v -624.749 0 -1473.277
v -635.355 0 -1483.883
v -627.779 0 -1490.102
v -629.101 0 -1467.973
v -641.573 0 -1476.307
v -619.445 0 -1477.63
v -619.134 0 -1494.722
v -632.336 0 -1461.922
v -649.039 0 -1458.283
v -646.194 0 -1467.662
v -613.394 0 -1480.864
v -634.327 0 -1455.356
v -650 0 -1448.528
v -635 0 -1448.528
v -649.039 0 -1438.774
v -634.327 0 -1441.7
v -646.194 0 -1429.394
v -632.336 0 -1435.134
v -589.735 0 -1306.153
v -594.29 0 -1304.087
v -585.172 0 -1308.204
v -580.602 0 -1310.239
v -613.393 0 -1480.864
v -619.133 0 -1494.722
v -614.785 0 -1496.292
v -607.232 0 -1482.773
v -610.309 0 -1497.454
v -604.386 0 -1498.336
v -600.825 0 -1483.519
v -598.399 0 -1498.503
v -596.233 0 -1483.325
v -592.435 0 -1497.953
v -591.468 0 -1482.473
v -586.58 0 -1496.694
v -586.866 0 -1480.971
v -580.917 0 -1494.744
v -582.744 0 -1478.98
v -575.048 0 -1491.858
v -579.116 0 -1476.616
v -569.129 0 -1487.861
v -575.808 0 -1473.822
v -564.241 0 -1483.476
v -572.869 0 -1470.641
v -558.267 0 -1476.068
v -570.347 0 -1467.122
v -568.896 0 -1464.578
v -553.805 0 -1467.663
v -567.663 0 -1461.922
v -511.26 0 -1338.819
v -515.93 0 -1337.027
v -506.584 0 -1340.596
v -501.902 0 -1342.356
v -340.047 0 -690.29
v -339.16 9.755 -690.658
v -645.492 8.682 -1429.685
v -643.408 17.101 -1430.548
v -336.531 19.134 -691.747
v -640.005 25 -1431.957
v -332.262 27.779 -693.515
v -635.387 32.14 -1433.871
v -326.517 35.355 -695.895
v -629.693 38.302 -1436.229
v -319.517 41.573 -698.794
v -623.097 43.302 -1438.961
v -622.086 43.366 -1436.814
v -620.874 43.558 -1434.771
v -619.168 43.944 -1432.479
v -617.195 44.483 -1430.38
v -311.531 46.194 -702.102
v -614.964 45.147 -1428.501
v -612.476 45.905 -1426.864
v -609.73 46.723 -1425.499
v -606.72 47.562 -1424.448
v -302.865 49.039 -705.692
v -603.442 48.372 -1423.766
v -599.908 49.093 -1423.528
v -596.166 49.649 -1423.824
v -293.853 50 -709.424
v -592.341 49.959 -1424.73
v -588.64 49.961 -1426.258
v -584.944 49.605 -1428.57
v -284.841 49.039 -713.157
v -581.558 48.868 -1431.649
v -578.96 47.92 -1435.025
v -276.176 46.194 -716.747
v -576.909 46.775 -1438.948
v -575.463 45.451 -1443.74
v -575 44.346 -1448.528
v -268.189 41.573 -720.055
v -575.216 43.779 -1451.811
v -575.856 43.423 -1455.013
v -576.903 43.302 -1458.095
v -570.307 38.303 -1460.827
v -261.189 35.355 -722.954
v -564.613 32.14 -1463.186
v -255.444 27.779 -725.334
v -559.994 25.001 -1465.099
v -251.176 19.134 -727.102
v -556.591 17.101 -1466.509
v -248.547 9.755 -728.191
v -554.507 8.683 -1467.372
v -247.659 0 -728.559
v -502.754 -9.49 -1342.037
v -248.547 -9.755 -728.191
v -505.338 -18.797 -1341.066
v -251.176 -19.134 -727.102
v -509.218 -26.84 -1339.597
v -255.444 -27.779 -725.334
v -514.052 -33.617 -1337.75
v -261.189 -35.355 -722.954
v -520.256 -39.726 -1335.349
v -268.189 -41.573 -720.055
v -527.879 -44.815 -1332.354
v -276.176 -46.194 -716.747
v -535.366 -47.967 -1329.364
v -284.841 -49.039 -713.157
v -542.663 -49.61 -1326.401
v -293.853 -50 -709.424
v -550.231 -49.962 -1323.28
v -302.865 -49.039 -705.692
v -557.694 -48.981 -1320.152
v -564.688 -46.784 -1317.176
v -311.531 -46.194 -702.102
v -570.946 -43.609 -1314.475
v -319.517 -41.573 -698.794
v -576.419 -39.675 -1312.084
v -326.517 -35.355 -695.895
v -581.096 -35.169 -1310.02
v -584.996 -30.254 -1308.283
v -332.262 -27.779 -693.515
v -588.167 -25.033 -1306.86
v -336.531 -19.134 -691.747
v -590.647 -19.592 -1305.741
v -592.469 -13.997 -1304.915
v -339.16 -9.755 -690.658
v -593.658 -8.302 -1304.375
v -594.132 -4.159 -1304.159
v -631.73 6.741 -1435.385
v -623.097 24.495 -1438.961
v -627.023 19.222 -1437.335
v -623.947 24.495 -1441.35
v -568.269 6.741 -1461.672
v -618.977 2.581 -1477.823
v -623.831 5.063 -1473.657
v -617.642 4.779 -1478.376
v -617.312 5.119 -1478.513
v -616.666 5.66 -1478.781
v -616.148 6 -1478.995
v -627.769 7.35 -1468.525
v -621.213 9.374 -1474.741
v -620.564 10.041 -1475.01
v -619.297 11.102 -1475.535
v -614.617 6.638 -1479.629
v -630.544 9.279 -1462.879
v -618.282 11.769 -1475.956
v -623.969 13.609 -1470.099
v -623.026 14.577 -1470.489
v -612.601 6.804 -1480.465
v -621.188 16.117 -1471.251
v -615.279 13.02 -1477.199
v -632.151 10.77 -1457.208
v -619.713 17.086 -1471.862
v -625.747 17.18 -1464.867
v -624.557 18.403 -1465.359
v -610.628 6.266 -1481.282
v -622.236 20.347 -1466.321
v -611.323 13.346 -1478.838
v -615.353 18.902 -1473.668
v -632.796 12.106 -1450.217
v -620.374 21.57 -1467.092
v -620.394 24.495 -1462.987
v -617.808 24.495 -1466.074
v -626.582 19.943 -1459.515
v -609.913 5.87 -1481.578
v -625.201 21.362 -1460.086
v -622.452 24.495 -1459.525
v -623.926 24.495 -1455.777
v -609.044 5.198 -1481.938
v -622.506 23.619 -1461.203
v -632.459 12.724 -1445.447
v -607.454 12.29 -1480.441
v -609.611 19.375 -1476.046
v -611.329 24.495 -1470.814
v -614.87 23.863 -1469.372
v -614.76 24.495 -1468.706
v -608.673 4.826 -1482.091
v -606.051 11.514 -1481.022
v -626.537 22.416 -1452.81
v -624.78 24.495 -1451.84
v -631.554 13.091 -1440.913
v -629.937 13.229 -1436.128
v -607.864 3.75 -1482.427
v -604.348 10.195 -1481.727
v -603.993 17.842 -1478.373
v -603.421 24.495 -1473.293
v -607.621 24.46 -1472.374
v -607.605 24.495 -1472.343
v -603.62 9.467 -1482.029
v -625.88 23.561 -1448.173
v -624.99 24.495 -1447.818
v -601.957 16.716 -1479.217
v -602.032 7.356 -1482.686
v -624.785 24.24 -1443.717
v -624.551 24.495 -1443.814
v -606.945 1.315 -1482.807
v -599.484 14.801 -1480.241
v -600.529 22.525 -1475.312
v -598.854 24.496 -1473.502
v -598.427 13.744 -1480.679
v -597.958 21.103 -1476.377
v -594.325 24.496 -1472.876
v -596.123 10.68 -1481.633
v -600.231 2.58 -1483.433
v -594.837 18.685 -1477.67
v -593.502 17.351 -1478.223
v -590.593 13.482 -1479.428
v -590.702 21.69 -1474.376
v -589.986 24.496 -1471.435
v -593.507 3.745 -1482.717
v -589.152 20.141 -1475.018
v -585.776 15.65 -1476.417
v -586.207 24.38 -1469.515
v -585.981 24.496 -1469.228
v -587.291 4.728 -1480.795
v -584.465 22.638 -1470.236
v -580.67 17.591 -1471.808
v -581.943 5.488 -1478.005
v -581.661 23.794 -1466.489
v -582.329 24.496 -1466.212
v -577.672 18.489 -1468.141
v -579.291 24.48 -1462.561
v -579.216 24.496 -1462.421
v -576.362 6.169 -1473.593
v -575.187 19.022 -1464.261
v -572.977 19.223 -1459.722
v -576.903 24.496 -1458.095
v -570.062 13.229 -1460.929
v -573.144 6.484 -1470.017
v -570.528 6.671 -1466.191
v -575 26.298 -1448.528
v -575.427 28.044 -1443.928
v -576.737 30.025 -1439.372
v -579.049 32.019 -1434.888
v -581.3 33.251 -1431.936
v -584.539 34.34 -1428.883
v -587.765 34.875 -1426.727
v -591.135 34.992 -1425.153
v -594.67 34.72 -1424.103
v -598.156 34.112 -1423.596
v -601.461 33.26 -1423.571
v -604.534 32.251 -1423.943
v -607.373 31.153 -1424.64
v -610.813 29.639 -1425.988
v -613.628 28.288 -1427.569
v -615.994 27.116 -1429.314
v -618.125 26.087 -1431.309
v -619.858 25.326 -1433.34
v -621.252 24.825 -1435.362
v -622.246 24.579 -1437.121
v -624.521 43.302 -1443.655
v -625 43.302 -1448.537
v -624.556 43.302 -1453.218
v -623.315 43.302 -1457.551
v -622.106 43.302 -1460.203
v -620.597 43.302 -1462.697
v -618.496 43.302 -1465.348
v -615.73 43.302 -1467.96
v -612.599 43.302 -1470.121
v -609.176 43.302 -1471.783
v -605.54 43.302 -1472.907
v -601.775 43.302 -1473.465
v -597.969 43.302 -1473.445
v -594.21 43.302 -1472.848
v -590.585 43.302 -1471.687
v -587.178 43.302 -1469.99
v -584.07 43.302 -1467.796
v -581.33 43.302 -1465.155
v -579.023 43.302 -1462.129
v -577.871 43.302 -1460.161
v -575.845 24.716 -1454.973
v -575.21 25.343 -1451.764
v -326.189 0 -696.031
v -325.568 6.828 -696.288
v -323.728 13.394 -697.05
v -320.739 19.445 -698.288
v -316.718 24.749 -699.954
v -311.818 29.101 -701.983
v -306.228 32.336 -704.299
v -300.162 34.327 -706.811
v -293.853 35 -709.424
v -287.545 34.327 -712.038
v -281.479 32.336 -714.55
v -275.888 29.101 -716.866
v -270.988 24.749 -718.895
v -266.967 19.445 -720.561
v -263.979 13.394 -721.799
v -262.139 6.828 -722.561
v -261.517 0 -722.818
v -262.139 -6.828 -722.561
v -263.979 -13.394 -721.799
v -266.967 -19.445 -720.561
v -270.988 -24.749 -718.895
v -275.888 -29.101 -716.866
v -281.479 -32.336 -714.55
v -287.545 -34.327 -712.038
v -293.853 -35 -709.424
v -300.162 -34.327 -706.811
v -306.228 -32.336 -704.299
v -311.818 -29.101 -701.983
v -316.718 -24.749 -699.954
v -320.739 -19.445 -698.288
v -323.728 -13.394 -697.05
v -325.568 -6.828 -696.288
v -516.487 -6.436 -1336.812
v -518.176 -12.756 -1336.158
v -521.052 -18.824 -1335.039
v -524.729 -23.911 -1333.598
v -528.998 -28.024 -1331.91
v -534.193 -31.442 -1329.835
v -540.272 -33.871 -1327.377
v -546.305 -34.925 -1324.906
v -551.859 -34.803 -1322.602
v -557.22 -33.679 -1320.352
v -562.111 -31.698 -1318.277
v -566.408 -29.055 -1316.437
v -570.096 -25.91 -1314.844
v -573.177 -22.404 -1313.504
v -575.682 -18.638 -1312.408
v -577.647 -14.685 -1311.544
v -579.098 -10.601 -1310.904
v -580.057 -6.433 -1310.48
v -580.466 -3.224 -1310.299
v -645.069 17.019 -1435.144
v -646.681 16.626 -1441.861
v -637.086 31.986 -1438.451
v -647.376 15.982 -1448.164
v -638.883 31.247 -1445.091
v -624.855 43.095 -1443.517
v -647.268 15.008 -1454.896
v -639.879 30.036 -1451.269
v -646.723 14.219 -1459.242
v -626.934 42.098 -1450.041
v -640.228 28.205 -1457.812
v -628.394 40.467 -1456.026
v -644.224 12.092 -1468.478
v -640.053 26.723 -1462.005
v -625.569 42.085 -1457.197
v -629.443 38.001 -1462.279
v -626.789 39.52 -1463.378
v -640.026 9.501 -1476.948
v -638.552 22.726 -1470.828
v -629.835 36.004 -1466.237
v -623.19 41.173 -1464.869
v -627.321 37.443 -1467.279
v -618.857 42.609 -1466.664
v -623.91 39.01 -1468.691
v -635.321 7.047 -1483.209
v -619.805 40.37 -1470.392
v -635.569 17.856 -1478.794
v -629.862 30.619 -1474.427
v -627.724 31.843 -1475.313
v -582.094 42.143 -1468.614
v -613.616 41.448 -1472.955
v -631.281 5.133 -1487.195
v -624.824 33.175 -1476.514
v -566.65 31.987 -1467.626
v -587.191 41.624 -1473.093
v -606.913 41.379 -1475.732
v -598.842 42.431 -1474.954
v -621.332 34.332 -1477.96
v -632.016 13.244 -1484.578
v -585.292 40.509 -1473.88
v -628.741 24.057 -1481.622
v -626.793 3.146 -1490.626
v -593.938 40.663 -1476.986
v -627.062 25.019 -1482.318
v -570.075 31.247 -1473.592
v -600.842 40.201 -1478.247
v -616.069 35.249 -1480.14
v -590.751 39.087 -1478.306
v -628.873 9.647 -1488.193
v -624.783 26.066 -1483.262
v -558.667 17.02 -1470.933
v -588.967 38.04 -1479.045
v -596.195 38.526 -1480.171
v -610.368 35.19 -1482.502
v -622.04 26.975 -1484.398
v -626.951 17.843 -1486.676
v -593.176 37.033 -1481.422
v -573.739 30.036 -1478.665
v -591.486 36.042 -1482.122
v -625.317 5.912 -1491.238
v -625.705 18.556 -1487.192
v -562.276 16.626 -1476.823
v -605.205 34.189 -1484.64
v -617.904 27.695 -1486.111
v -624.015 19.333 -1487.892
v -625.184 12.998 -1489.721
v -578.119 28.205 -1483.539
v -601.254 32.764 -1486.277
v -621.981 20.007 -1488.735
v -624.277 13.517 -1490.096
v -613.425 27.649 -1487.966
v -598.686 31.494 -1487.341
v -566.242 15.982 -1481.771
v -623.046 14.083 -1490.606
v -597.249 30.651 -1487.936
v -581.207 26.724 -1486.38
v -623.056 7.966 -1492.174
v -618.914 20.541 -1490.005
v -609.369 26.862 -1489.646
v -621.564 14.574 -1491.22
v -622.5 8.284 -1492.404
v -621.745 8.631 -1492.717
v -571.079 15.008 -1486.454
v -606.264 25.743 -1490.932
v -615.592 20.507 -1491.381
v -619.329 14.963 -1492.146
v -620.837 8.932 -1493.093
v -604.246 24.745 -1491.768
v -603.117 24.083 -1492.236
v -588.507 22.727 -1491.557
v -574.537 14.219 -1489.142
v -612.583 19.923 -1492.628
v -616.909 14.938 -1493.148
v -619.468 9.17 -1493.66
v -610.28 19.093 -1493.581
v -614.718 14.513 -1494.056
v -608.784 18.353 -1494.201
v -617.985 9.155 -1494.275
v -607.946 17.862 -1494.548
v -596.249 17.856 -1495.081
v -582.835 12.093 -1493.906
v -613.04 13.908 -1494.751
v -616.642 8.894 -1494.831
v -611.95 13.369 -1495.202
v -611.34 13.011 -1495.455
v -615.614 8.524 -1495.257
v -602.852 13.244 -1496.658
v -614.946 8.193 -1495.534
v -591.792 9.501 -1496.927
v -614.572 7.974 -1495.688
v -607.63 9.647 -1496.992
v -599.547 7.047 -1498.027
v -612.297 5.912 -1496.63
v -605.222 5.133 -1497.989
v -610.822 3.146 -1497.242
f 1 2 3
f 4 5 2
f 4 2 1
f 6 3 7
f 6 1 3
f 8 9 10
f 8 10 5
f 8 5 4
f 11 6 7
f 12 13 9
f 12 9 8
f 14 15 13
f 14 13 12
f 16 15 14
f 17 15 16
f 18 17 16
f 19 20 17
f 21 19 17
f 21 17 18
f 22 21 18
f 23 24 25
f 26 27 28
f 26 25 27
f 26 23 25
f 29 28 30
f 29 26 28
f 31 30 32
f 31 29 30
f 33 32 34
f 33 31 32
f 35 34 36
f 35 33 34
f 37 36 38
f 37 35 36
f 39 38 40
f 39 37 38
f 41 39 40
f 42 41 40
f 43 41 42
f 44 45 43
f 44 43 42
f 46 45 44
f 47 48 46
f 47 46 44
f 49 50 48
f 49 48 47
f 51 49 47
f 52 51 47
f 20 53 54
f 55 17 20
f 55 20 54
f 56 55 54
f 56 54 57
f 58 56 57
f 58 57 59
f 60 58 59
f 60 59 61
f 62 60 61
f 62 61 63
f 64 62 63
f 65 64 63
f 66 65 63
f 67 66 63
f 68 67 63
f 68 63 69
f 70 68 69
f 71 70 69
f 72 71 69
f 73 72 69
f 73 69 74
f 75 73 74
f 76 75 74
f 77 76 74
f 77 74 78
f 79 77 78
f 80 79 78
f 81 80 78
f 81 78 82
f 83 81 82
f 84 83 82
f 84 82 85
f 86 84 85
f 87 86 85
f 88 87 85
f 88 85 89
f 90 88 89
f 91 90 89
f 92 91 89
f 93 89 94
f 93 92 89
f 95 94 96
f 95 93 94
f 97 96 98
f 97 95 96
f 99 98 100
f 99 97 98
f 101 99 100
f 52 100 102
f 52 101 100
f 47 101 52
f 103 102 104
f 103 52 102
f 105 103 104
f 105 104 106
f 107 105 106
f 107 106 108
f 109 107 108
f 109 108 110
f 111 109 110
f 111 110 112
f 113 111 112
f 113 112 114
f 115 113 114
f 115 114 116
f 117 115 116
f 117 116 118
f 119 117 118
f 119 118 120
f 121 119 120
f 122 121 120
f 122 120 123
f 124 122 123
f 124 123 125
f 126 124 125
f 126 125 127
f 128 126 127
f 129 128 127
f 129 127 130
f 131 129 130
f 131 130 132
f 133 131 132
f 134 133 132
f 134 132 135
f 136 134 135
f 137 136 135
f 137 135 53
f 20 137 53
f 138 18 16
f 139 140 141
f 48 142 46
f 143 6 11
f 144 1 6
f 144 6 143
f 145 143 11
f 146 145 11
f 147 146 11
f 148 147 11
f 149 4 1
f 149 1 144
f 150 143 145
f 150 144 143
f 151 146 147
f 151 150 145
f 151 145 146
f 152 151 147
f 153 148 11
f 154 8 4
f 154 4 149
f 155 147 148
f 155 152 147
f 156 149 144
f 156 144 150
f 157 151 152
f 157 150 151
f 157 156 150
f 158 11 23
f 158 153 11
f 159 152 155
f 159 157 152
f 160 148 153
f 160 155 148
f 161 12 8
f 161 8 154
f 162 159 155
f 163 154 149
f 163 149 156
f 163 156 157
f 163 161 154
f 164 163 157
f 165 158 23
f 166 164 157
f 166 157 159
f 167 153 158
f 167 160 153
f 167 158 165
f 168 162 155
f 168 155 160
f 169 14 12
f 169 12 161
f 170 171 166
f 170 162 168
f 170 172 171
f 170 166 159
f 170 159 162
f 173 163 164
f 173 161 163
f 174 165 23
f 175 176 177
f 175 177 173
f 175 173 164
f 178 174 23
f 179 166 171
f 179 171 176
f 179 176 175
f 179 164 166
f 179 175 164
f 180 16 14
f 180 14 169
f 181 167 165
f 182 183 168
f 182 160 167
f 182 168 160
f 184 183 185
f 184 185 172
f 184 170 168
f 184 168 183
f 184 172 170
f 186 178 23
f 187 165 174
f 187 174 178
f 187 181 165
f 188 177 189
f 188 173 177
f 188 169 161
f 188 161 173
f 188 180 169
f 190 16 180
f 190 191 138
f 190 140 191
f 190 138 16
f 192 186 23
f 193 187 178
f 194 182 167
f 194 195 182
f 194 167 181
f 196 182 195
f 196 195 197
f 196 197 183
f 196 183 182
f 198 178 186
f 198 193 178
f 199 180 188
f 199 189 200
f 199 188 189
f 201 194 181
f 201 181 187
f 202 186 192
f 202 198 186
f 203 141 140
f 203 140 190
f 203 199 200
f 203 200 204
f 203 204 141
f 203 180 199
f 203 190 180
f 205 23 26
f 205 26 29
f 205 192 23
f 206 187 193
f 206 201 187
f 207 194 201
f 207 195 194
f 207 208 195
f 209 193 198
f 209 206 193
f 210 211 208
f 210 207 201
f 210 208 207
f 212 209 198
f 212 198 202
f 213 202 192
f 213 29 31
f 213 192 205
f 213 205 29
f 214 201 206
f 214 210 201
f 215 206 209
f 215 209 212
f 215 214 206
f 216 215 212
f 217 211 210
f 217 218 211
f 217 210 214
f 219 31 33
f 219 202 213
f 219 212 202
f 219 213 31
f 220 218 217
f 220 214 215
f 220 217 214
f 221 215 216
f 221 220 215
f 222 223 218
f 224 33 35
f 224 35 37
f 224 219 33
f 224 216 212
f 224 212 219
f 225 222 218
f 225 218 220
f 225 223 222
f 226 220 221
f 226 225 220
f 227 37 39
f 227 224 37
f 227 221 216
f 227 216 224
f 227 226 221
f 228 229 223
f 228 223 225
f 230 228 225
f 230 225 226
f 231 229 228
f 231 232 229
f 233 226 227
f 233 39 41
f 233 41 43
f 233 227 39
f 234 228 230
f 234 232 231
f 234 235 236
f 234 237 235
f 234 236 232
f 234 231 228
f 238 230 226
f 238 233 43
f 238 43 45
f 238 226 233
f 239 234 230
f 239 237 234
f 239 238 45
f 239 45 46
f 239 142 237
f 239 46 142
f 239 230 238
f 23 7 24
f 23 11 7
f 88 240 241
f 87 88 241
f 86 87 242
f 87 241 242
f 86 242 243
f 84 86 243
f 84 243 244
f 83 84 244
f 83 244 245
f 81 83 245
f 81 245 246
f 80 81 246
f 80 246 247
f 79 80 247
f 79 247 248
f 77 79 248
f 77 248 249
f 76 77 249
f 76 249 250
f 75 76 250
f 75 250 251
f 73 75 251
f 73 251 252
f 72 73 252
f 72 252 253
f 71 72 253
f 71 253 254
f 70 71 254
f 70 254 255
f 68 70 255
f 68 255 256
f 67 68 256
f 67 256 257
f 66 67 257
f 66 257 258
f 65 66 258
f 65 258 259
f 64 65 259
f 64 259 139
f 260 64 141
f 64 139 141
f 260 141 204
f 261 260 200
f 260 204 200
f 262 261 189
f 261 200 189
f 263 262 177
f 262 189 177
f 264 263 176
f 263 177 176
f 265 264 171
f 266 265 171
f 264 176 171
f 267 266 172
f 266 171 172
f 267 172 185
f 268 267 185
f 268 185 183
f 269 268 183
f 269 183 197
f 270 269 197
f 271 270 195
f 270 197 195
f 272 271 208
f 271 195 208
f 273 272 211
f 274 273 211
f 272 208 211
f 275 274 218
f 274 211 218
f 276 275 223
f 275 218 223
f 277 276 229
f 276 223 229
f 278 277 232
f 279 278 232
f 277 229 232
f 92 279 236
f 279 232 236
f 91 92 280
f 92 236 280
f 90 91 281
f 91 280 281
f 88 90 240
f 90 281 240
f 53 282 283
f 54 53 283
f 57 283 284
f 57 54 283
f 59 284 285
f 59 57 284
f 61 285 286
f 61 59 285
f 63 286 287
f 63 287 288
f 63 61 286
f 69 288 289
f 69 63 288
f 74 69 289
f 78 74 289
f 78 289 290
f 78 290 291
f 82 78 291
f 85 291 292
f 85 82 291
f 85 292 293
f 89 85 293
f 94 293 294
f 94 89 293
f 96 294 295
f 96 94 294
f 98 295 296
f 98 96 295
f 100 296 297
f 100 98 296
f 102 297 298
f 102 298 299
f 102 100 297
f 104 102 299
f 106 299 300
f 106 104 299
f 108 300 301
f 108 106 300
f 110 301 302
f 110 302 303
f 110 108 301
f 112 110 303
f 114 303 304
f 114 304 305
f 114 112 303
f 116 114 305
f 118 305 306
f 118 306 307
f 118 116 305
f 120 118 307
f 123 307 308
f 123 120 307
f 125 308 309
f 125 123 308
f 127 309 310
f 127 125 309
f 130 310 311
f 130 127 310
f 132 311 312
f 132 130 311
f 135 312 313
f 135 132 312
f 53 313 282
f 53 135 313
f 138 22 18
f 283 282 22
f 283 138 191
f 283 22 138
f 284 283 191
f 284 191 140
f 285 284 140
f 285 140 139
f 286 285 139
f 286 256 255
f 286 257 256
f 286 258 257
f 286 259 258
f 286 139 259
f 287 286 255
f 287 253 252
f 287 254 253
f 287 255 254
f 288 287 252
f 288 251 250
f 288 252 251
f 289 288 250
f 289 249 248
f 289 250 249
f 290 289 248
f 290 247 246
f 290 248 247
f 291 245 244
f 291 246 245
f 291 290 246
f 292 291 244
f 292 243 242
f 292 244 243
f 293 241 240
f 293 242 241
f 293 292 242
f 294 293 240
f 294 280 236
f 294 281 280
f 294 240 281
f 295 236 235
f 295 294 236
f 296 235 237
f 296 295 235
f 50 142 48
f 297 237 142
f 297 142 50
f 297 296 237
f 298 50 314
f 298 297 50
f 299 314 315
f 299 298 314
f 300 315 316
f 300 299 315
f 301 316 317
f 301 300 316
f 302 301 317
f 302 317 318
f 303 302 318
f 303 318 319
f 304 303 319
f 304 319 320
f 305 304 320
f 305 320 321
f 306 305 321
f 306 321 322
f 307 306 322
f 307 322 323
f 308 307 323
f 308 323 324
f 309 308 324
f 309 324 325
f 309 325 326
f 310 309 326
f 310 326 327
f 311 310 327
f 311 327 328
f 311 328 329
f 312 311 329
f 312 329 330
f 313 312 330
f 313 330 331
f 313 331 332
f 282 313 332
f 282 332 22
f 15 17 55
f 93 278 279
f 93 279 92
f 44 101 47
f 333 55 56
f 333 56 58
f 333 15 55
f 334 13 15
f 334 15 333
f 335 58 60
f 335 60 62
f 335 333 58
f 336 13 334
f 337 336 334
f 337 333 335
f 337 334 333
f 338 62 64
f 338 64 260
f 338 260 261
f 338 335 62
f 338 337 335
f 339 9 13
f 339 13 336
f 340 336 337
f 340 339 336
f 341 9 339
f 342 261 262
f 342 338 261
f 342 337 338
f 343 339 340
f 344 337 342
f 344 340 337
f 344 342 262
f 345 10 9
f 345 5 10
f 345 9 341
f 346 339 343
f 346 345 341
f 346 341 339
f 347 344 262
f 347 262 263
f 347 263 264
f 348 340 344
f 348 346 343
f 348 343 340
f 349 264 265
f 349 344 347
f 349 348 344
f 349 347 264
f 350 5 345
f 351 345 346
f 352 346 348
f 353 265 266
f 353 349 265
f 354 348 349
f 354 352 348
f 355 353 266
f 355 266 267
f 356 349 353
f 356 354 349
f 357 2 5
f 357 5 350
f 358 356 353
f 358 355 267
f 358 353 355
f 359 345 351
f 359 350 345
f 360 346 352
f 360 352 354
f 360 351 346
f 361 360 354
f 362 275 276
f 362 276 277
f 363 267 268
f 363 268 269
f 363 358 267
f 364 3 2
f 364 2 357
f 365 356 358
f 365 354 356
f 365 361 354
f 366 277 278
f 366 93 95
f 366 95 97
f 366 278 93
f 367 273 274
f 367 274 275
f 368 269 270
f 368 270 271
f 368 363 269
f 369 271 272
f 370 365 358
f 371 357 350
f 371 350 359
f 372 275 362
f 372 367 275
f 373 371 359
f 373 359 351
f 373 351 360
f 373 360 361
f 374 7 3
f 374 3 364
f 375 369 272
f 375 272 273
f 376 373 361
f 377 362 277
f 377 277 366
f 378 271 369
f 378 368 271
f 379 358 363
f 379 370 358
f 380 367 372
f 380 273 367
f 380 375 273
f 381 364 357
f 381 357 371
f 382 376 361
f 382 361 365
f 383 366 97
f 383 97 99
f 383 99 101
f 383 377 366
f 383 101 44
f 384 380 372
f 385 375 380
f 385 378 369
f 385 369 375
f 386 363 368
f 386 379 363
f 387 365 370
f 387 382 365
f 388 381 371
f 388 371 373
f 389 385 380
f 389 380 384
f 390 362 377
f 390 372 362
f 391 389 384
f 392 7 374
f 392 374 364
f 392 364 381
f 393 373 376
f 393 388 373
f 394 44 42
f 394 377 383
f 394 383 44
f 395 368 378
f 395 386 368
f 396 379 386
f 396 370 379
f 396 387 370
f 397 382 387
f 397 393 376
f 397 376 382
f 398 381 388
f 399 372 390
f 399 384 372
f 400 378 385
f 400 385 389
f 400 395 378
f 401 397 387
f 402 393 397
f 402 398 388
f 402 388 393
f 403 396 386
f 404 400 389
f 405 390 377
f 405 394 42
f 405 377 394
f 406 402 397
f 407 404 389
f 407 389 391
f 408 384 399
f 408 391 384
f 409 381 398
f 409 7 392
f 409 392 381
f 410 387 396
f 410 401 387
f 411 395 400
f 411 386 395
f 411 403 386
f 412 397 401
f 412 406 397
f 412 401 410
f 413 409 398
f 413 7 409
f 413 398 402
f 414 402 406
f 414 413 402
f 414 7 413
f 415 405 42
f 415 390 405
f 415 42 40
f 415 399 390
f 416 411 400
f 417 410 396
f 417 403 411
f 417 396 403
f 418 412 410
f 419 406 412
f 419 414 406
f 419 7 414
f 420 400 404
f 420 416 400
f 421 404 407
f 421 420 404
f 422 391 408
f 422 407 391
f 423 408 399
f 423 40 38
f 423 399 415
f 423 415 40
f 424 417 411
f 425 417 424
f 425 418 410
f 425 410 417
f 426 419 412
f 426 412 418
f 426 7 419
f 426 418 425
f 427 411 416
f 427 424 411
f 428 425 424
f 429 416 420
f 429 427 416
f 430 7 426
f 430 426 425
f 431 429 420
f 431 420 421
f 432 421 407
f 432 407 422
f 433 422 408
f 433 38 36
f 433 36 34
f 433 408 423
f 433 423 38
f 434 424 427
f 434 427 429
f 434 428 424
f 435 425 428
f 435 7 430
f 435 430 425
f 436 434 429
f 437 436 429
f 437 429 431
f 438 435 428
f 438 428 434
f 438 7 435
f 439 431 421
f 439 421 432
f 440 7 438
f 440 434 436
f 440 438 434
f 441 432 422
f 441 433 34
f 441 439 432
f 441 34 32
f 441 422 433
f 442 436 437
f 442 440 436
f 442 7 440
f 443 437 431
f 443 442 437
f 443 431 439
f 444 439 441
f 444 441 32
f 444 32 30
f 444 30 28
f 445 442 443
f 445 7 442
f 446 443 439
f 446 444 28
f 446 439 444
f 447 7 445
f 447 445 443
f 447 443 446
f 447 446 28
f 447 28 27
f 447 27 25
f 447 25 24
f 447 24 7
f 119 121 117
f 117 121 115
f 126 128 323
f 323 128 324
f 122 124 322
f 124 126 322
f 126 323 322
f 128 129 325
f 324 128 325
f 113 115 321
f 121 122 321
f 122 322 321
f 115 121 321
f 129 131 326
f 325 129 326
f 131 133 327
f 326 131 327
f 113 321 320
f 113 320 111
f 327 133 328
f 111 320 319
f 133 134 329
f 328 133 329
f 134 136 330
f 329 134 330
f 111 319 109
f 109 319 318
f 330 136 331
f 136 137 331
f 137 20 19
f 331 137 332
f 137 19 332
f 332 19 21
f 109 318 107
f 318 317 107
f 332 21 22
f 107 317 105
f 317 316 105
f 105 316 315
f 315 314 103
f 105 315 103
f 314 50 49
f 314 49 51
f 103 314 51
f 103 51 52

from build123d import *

# Parameters (mm, degrees)
F3_R     = 25
F4_DEPTH = 142.02346
F5_R     = 1675.475624
F5_R_2   = 1433.116866
F6_DEPTH = 100


with BuildPart() as f2:
    # F1 (on Front) → F2 (revolve)
    with BuildSketch(Plane.XZ):
        with BuildLine():
            Line((-326.189038, -696.030591), (-340.047231, -690.29034))
            Line((-340.047231, -690.29034), (-646.193977, -1429.393966))
            ThreePointArc((-646.193977, -1429.393966), (-646.193977, -1467.662309), (-619.134172, -1494.722114))
            Line((-619.134172, -1494.722114), (-613.39392, -1480.863921))
            ThreePointArc((-613.39392, -1480.863921), (-632.335784, -1461.922058), (-632.335784, -1435.134217))
            Line((-632.335784, -1435.134217), (-326.189038, -696.030591))
        make_face()
    revolve(axis=Axis((-300, 0, -724.264069), (-0.382683, 0, -0.92388)))

    # F3 (on Front) → F4 (cut, symmetric)
    with BuildSketch(Plane.XZ):
        with Locations((-600, -1448.528137)):
            Circle(F3_R)
    extrude(amount=F4_DEPTH, both=True, mode=Mode.SUBTRACT)

    # F5 (on Front) → F6 (cut)
    with BuildSketch(Plane.XZ):
        Circle(F5_R)
        Circle(F5_R_2, mode=Mode.SUBTRACT)
    extrude(amount=F6_DEPTH, mode=Mode.SUBTRACT)


solid = f2.part
